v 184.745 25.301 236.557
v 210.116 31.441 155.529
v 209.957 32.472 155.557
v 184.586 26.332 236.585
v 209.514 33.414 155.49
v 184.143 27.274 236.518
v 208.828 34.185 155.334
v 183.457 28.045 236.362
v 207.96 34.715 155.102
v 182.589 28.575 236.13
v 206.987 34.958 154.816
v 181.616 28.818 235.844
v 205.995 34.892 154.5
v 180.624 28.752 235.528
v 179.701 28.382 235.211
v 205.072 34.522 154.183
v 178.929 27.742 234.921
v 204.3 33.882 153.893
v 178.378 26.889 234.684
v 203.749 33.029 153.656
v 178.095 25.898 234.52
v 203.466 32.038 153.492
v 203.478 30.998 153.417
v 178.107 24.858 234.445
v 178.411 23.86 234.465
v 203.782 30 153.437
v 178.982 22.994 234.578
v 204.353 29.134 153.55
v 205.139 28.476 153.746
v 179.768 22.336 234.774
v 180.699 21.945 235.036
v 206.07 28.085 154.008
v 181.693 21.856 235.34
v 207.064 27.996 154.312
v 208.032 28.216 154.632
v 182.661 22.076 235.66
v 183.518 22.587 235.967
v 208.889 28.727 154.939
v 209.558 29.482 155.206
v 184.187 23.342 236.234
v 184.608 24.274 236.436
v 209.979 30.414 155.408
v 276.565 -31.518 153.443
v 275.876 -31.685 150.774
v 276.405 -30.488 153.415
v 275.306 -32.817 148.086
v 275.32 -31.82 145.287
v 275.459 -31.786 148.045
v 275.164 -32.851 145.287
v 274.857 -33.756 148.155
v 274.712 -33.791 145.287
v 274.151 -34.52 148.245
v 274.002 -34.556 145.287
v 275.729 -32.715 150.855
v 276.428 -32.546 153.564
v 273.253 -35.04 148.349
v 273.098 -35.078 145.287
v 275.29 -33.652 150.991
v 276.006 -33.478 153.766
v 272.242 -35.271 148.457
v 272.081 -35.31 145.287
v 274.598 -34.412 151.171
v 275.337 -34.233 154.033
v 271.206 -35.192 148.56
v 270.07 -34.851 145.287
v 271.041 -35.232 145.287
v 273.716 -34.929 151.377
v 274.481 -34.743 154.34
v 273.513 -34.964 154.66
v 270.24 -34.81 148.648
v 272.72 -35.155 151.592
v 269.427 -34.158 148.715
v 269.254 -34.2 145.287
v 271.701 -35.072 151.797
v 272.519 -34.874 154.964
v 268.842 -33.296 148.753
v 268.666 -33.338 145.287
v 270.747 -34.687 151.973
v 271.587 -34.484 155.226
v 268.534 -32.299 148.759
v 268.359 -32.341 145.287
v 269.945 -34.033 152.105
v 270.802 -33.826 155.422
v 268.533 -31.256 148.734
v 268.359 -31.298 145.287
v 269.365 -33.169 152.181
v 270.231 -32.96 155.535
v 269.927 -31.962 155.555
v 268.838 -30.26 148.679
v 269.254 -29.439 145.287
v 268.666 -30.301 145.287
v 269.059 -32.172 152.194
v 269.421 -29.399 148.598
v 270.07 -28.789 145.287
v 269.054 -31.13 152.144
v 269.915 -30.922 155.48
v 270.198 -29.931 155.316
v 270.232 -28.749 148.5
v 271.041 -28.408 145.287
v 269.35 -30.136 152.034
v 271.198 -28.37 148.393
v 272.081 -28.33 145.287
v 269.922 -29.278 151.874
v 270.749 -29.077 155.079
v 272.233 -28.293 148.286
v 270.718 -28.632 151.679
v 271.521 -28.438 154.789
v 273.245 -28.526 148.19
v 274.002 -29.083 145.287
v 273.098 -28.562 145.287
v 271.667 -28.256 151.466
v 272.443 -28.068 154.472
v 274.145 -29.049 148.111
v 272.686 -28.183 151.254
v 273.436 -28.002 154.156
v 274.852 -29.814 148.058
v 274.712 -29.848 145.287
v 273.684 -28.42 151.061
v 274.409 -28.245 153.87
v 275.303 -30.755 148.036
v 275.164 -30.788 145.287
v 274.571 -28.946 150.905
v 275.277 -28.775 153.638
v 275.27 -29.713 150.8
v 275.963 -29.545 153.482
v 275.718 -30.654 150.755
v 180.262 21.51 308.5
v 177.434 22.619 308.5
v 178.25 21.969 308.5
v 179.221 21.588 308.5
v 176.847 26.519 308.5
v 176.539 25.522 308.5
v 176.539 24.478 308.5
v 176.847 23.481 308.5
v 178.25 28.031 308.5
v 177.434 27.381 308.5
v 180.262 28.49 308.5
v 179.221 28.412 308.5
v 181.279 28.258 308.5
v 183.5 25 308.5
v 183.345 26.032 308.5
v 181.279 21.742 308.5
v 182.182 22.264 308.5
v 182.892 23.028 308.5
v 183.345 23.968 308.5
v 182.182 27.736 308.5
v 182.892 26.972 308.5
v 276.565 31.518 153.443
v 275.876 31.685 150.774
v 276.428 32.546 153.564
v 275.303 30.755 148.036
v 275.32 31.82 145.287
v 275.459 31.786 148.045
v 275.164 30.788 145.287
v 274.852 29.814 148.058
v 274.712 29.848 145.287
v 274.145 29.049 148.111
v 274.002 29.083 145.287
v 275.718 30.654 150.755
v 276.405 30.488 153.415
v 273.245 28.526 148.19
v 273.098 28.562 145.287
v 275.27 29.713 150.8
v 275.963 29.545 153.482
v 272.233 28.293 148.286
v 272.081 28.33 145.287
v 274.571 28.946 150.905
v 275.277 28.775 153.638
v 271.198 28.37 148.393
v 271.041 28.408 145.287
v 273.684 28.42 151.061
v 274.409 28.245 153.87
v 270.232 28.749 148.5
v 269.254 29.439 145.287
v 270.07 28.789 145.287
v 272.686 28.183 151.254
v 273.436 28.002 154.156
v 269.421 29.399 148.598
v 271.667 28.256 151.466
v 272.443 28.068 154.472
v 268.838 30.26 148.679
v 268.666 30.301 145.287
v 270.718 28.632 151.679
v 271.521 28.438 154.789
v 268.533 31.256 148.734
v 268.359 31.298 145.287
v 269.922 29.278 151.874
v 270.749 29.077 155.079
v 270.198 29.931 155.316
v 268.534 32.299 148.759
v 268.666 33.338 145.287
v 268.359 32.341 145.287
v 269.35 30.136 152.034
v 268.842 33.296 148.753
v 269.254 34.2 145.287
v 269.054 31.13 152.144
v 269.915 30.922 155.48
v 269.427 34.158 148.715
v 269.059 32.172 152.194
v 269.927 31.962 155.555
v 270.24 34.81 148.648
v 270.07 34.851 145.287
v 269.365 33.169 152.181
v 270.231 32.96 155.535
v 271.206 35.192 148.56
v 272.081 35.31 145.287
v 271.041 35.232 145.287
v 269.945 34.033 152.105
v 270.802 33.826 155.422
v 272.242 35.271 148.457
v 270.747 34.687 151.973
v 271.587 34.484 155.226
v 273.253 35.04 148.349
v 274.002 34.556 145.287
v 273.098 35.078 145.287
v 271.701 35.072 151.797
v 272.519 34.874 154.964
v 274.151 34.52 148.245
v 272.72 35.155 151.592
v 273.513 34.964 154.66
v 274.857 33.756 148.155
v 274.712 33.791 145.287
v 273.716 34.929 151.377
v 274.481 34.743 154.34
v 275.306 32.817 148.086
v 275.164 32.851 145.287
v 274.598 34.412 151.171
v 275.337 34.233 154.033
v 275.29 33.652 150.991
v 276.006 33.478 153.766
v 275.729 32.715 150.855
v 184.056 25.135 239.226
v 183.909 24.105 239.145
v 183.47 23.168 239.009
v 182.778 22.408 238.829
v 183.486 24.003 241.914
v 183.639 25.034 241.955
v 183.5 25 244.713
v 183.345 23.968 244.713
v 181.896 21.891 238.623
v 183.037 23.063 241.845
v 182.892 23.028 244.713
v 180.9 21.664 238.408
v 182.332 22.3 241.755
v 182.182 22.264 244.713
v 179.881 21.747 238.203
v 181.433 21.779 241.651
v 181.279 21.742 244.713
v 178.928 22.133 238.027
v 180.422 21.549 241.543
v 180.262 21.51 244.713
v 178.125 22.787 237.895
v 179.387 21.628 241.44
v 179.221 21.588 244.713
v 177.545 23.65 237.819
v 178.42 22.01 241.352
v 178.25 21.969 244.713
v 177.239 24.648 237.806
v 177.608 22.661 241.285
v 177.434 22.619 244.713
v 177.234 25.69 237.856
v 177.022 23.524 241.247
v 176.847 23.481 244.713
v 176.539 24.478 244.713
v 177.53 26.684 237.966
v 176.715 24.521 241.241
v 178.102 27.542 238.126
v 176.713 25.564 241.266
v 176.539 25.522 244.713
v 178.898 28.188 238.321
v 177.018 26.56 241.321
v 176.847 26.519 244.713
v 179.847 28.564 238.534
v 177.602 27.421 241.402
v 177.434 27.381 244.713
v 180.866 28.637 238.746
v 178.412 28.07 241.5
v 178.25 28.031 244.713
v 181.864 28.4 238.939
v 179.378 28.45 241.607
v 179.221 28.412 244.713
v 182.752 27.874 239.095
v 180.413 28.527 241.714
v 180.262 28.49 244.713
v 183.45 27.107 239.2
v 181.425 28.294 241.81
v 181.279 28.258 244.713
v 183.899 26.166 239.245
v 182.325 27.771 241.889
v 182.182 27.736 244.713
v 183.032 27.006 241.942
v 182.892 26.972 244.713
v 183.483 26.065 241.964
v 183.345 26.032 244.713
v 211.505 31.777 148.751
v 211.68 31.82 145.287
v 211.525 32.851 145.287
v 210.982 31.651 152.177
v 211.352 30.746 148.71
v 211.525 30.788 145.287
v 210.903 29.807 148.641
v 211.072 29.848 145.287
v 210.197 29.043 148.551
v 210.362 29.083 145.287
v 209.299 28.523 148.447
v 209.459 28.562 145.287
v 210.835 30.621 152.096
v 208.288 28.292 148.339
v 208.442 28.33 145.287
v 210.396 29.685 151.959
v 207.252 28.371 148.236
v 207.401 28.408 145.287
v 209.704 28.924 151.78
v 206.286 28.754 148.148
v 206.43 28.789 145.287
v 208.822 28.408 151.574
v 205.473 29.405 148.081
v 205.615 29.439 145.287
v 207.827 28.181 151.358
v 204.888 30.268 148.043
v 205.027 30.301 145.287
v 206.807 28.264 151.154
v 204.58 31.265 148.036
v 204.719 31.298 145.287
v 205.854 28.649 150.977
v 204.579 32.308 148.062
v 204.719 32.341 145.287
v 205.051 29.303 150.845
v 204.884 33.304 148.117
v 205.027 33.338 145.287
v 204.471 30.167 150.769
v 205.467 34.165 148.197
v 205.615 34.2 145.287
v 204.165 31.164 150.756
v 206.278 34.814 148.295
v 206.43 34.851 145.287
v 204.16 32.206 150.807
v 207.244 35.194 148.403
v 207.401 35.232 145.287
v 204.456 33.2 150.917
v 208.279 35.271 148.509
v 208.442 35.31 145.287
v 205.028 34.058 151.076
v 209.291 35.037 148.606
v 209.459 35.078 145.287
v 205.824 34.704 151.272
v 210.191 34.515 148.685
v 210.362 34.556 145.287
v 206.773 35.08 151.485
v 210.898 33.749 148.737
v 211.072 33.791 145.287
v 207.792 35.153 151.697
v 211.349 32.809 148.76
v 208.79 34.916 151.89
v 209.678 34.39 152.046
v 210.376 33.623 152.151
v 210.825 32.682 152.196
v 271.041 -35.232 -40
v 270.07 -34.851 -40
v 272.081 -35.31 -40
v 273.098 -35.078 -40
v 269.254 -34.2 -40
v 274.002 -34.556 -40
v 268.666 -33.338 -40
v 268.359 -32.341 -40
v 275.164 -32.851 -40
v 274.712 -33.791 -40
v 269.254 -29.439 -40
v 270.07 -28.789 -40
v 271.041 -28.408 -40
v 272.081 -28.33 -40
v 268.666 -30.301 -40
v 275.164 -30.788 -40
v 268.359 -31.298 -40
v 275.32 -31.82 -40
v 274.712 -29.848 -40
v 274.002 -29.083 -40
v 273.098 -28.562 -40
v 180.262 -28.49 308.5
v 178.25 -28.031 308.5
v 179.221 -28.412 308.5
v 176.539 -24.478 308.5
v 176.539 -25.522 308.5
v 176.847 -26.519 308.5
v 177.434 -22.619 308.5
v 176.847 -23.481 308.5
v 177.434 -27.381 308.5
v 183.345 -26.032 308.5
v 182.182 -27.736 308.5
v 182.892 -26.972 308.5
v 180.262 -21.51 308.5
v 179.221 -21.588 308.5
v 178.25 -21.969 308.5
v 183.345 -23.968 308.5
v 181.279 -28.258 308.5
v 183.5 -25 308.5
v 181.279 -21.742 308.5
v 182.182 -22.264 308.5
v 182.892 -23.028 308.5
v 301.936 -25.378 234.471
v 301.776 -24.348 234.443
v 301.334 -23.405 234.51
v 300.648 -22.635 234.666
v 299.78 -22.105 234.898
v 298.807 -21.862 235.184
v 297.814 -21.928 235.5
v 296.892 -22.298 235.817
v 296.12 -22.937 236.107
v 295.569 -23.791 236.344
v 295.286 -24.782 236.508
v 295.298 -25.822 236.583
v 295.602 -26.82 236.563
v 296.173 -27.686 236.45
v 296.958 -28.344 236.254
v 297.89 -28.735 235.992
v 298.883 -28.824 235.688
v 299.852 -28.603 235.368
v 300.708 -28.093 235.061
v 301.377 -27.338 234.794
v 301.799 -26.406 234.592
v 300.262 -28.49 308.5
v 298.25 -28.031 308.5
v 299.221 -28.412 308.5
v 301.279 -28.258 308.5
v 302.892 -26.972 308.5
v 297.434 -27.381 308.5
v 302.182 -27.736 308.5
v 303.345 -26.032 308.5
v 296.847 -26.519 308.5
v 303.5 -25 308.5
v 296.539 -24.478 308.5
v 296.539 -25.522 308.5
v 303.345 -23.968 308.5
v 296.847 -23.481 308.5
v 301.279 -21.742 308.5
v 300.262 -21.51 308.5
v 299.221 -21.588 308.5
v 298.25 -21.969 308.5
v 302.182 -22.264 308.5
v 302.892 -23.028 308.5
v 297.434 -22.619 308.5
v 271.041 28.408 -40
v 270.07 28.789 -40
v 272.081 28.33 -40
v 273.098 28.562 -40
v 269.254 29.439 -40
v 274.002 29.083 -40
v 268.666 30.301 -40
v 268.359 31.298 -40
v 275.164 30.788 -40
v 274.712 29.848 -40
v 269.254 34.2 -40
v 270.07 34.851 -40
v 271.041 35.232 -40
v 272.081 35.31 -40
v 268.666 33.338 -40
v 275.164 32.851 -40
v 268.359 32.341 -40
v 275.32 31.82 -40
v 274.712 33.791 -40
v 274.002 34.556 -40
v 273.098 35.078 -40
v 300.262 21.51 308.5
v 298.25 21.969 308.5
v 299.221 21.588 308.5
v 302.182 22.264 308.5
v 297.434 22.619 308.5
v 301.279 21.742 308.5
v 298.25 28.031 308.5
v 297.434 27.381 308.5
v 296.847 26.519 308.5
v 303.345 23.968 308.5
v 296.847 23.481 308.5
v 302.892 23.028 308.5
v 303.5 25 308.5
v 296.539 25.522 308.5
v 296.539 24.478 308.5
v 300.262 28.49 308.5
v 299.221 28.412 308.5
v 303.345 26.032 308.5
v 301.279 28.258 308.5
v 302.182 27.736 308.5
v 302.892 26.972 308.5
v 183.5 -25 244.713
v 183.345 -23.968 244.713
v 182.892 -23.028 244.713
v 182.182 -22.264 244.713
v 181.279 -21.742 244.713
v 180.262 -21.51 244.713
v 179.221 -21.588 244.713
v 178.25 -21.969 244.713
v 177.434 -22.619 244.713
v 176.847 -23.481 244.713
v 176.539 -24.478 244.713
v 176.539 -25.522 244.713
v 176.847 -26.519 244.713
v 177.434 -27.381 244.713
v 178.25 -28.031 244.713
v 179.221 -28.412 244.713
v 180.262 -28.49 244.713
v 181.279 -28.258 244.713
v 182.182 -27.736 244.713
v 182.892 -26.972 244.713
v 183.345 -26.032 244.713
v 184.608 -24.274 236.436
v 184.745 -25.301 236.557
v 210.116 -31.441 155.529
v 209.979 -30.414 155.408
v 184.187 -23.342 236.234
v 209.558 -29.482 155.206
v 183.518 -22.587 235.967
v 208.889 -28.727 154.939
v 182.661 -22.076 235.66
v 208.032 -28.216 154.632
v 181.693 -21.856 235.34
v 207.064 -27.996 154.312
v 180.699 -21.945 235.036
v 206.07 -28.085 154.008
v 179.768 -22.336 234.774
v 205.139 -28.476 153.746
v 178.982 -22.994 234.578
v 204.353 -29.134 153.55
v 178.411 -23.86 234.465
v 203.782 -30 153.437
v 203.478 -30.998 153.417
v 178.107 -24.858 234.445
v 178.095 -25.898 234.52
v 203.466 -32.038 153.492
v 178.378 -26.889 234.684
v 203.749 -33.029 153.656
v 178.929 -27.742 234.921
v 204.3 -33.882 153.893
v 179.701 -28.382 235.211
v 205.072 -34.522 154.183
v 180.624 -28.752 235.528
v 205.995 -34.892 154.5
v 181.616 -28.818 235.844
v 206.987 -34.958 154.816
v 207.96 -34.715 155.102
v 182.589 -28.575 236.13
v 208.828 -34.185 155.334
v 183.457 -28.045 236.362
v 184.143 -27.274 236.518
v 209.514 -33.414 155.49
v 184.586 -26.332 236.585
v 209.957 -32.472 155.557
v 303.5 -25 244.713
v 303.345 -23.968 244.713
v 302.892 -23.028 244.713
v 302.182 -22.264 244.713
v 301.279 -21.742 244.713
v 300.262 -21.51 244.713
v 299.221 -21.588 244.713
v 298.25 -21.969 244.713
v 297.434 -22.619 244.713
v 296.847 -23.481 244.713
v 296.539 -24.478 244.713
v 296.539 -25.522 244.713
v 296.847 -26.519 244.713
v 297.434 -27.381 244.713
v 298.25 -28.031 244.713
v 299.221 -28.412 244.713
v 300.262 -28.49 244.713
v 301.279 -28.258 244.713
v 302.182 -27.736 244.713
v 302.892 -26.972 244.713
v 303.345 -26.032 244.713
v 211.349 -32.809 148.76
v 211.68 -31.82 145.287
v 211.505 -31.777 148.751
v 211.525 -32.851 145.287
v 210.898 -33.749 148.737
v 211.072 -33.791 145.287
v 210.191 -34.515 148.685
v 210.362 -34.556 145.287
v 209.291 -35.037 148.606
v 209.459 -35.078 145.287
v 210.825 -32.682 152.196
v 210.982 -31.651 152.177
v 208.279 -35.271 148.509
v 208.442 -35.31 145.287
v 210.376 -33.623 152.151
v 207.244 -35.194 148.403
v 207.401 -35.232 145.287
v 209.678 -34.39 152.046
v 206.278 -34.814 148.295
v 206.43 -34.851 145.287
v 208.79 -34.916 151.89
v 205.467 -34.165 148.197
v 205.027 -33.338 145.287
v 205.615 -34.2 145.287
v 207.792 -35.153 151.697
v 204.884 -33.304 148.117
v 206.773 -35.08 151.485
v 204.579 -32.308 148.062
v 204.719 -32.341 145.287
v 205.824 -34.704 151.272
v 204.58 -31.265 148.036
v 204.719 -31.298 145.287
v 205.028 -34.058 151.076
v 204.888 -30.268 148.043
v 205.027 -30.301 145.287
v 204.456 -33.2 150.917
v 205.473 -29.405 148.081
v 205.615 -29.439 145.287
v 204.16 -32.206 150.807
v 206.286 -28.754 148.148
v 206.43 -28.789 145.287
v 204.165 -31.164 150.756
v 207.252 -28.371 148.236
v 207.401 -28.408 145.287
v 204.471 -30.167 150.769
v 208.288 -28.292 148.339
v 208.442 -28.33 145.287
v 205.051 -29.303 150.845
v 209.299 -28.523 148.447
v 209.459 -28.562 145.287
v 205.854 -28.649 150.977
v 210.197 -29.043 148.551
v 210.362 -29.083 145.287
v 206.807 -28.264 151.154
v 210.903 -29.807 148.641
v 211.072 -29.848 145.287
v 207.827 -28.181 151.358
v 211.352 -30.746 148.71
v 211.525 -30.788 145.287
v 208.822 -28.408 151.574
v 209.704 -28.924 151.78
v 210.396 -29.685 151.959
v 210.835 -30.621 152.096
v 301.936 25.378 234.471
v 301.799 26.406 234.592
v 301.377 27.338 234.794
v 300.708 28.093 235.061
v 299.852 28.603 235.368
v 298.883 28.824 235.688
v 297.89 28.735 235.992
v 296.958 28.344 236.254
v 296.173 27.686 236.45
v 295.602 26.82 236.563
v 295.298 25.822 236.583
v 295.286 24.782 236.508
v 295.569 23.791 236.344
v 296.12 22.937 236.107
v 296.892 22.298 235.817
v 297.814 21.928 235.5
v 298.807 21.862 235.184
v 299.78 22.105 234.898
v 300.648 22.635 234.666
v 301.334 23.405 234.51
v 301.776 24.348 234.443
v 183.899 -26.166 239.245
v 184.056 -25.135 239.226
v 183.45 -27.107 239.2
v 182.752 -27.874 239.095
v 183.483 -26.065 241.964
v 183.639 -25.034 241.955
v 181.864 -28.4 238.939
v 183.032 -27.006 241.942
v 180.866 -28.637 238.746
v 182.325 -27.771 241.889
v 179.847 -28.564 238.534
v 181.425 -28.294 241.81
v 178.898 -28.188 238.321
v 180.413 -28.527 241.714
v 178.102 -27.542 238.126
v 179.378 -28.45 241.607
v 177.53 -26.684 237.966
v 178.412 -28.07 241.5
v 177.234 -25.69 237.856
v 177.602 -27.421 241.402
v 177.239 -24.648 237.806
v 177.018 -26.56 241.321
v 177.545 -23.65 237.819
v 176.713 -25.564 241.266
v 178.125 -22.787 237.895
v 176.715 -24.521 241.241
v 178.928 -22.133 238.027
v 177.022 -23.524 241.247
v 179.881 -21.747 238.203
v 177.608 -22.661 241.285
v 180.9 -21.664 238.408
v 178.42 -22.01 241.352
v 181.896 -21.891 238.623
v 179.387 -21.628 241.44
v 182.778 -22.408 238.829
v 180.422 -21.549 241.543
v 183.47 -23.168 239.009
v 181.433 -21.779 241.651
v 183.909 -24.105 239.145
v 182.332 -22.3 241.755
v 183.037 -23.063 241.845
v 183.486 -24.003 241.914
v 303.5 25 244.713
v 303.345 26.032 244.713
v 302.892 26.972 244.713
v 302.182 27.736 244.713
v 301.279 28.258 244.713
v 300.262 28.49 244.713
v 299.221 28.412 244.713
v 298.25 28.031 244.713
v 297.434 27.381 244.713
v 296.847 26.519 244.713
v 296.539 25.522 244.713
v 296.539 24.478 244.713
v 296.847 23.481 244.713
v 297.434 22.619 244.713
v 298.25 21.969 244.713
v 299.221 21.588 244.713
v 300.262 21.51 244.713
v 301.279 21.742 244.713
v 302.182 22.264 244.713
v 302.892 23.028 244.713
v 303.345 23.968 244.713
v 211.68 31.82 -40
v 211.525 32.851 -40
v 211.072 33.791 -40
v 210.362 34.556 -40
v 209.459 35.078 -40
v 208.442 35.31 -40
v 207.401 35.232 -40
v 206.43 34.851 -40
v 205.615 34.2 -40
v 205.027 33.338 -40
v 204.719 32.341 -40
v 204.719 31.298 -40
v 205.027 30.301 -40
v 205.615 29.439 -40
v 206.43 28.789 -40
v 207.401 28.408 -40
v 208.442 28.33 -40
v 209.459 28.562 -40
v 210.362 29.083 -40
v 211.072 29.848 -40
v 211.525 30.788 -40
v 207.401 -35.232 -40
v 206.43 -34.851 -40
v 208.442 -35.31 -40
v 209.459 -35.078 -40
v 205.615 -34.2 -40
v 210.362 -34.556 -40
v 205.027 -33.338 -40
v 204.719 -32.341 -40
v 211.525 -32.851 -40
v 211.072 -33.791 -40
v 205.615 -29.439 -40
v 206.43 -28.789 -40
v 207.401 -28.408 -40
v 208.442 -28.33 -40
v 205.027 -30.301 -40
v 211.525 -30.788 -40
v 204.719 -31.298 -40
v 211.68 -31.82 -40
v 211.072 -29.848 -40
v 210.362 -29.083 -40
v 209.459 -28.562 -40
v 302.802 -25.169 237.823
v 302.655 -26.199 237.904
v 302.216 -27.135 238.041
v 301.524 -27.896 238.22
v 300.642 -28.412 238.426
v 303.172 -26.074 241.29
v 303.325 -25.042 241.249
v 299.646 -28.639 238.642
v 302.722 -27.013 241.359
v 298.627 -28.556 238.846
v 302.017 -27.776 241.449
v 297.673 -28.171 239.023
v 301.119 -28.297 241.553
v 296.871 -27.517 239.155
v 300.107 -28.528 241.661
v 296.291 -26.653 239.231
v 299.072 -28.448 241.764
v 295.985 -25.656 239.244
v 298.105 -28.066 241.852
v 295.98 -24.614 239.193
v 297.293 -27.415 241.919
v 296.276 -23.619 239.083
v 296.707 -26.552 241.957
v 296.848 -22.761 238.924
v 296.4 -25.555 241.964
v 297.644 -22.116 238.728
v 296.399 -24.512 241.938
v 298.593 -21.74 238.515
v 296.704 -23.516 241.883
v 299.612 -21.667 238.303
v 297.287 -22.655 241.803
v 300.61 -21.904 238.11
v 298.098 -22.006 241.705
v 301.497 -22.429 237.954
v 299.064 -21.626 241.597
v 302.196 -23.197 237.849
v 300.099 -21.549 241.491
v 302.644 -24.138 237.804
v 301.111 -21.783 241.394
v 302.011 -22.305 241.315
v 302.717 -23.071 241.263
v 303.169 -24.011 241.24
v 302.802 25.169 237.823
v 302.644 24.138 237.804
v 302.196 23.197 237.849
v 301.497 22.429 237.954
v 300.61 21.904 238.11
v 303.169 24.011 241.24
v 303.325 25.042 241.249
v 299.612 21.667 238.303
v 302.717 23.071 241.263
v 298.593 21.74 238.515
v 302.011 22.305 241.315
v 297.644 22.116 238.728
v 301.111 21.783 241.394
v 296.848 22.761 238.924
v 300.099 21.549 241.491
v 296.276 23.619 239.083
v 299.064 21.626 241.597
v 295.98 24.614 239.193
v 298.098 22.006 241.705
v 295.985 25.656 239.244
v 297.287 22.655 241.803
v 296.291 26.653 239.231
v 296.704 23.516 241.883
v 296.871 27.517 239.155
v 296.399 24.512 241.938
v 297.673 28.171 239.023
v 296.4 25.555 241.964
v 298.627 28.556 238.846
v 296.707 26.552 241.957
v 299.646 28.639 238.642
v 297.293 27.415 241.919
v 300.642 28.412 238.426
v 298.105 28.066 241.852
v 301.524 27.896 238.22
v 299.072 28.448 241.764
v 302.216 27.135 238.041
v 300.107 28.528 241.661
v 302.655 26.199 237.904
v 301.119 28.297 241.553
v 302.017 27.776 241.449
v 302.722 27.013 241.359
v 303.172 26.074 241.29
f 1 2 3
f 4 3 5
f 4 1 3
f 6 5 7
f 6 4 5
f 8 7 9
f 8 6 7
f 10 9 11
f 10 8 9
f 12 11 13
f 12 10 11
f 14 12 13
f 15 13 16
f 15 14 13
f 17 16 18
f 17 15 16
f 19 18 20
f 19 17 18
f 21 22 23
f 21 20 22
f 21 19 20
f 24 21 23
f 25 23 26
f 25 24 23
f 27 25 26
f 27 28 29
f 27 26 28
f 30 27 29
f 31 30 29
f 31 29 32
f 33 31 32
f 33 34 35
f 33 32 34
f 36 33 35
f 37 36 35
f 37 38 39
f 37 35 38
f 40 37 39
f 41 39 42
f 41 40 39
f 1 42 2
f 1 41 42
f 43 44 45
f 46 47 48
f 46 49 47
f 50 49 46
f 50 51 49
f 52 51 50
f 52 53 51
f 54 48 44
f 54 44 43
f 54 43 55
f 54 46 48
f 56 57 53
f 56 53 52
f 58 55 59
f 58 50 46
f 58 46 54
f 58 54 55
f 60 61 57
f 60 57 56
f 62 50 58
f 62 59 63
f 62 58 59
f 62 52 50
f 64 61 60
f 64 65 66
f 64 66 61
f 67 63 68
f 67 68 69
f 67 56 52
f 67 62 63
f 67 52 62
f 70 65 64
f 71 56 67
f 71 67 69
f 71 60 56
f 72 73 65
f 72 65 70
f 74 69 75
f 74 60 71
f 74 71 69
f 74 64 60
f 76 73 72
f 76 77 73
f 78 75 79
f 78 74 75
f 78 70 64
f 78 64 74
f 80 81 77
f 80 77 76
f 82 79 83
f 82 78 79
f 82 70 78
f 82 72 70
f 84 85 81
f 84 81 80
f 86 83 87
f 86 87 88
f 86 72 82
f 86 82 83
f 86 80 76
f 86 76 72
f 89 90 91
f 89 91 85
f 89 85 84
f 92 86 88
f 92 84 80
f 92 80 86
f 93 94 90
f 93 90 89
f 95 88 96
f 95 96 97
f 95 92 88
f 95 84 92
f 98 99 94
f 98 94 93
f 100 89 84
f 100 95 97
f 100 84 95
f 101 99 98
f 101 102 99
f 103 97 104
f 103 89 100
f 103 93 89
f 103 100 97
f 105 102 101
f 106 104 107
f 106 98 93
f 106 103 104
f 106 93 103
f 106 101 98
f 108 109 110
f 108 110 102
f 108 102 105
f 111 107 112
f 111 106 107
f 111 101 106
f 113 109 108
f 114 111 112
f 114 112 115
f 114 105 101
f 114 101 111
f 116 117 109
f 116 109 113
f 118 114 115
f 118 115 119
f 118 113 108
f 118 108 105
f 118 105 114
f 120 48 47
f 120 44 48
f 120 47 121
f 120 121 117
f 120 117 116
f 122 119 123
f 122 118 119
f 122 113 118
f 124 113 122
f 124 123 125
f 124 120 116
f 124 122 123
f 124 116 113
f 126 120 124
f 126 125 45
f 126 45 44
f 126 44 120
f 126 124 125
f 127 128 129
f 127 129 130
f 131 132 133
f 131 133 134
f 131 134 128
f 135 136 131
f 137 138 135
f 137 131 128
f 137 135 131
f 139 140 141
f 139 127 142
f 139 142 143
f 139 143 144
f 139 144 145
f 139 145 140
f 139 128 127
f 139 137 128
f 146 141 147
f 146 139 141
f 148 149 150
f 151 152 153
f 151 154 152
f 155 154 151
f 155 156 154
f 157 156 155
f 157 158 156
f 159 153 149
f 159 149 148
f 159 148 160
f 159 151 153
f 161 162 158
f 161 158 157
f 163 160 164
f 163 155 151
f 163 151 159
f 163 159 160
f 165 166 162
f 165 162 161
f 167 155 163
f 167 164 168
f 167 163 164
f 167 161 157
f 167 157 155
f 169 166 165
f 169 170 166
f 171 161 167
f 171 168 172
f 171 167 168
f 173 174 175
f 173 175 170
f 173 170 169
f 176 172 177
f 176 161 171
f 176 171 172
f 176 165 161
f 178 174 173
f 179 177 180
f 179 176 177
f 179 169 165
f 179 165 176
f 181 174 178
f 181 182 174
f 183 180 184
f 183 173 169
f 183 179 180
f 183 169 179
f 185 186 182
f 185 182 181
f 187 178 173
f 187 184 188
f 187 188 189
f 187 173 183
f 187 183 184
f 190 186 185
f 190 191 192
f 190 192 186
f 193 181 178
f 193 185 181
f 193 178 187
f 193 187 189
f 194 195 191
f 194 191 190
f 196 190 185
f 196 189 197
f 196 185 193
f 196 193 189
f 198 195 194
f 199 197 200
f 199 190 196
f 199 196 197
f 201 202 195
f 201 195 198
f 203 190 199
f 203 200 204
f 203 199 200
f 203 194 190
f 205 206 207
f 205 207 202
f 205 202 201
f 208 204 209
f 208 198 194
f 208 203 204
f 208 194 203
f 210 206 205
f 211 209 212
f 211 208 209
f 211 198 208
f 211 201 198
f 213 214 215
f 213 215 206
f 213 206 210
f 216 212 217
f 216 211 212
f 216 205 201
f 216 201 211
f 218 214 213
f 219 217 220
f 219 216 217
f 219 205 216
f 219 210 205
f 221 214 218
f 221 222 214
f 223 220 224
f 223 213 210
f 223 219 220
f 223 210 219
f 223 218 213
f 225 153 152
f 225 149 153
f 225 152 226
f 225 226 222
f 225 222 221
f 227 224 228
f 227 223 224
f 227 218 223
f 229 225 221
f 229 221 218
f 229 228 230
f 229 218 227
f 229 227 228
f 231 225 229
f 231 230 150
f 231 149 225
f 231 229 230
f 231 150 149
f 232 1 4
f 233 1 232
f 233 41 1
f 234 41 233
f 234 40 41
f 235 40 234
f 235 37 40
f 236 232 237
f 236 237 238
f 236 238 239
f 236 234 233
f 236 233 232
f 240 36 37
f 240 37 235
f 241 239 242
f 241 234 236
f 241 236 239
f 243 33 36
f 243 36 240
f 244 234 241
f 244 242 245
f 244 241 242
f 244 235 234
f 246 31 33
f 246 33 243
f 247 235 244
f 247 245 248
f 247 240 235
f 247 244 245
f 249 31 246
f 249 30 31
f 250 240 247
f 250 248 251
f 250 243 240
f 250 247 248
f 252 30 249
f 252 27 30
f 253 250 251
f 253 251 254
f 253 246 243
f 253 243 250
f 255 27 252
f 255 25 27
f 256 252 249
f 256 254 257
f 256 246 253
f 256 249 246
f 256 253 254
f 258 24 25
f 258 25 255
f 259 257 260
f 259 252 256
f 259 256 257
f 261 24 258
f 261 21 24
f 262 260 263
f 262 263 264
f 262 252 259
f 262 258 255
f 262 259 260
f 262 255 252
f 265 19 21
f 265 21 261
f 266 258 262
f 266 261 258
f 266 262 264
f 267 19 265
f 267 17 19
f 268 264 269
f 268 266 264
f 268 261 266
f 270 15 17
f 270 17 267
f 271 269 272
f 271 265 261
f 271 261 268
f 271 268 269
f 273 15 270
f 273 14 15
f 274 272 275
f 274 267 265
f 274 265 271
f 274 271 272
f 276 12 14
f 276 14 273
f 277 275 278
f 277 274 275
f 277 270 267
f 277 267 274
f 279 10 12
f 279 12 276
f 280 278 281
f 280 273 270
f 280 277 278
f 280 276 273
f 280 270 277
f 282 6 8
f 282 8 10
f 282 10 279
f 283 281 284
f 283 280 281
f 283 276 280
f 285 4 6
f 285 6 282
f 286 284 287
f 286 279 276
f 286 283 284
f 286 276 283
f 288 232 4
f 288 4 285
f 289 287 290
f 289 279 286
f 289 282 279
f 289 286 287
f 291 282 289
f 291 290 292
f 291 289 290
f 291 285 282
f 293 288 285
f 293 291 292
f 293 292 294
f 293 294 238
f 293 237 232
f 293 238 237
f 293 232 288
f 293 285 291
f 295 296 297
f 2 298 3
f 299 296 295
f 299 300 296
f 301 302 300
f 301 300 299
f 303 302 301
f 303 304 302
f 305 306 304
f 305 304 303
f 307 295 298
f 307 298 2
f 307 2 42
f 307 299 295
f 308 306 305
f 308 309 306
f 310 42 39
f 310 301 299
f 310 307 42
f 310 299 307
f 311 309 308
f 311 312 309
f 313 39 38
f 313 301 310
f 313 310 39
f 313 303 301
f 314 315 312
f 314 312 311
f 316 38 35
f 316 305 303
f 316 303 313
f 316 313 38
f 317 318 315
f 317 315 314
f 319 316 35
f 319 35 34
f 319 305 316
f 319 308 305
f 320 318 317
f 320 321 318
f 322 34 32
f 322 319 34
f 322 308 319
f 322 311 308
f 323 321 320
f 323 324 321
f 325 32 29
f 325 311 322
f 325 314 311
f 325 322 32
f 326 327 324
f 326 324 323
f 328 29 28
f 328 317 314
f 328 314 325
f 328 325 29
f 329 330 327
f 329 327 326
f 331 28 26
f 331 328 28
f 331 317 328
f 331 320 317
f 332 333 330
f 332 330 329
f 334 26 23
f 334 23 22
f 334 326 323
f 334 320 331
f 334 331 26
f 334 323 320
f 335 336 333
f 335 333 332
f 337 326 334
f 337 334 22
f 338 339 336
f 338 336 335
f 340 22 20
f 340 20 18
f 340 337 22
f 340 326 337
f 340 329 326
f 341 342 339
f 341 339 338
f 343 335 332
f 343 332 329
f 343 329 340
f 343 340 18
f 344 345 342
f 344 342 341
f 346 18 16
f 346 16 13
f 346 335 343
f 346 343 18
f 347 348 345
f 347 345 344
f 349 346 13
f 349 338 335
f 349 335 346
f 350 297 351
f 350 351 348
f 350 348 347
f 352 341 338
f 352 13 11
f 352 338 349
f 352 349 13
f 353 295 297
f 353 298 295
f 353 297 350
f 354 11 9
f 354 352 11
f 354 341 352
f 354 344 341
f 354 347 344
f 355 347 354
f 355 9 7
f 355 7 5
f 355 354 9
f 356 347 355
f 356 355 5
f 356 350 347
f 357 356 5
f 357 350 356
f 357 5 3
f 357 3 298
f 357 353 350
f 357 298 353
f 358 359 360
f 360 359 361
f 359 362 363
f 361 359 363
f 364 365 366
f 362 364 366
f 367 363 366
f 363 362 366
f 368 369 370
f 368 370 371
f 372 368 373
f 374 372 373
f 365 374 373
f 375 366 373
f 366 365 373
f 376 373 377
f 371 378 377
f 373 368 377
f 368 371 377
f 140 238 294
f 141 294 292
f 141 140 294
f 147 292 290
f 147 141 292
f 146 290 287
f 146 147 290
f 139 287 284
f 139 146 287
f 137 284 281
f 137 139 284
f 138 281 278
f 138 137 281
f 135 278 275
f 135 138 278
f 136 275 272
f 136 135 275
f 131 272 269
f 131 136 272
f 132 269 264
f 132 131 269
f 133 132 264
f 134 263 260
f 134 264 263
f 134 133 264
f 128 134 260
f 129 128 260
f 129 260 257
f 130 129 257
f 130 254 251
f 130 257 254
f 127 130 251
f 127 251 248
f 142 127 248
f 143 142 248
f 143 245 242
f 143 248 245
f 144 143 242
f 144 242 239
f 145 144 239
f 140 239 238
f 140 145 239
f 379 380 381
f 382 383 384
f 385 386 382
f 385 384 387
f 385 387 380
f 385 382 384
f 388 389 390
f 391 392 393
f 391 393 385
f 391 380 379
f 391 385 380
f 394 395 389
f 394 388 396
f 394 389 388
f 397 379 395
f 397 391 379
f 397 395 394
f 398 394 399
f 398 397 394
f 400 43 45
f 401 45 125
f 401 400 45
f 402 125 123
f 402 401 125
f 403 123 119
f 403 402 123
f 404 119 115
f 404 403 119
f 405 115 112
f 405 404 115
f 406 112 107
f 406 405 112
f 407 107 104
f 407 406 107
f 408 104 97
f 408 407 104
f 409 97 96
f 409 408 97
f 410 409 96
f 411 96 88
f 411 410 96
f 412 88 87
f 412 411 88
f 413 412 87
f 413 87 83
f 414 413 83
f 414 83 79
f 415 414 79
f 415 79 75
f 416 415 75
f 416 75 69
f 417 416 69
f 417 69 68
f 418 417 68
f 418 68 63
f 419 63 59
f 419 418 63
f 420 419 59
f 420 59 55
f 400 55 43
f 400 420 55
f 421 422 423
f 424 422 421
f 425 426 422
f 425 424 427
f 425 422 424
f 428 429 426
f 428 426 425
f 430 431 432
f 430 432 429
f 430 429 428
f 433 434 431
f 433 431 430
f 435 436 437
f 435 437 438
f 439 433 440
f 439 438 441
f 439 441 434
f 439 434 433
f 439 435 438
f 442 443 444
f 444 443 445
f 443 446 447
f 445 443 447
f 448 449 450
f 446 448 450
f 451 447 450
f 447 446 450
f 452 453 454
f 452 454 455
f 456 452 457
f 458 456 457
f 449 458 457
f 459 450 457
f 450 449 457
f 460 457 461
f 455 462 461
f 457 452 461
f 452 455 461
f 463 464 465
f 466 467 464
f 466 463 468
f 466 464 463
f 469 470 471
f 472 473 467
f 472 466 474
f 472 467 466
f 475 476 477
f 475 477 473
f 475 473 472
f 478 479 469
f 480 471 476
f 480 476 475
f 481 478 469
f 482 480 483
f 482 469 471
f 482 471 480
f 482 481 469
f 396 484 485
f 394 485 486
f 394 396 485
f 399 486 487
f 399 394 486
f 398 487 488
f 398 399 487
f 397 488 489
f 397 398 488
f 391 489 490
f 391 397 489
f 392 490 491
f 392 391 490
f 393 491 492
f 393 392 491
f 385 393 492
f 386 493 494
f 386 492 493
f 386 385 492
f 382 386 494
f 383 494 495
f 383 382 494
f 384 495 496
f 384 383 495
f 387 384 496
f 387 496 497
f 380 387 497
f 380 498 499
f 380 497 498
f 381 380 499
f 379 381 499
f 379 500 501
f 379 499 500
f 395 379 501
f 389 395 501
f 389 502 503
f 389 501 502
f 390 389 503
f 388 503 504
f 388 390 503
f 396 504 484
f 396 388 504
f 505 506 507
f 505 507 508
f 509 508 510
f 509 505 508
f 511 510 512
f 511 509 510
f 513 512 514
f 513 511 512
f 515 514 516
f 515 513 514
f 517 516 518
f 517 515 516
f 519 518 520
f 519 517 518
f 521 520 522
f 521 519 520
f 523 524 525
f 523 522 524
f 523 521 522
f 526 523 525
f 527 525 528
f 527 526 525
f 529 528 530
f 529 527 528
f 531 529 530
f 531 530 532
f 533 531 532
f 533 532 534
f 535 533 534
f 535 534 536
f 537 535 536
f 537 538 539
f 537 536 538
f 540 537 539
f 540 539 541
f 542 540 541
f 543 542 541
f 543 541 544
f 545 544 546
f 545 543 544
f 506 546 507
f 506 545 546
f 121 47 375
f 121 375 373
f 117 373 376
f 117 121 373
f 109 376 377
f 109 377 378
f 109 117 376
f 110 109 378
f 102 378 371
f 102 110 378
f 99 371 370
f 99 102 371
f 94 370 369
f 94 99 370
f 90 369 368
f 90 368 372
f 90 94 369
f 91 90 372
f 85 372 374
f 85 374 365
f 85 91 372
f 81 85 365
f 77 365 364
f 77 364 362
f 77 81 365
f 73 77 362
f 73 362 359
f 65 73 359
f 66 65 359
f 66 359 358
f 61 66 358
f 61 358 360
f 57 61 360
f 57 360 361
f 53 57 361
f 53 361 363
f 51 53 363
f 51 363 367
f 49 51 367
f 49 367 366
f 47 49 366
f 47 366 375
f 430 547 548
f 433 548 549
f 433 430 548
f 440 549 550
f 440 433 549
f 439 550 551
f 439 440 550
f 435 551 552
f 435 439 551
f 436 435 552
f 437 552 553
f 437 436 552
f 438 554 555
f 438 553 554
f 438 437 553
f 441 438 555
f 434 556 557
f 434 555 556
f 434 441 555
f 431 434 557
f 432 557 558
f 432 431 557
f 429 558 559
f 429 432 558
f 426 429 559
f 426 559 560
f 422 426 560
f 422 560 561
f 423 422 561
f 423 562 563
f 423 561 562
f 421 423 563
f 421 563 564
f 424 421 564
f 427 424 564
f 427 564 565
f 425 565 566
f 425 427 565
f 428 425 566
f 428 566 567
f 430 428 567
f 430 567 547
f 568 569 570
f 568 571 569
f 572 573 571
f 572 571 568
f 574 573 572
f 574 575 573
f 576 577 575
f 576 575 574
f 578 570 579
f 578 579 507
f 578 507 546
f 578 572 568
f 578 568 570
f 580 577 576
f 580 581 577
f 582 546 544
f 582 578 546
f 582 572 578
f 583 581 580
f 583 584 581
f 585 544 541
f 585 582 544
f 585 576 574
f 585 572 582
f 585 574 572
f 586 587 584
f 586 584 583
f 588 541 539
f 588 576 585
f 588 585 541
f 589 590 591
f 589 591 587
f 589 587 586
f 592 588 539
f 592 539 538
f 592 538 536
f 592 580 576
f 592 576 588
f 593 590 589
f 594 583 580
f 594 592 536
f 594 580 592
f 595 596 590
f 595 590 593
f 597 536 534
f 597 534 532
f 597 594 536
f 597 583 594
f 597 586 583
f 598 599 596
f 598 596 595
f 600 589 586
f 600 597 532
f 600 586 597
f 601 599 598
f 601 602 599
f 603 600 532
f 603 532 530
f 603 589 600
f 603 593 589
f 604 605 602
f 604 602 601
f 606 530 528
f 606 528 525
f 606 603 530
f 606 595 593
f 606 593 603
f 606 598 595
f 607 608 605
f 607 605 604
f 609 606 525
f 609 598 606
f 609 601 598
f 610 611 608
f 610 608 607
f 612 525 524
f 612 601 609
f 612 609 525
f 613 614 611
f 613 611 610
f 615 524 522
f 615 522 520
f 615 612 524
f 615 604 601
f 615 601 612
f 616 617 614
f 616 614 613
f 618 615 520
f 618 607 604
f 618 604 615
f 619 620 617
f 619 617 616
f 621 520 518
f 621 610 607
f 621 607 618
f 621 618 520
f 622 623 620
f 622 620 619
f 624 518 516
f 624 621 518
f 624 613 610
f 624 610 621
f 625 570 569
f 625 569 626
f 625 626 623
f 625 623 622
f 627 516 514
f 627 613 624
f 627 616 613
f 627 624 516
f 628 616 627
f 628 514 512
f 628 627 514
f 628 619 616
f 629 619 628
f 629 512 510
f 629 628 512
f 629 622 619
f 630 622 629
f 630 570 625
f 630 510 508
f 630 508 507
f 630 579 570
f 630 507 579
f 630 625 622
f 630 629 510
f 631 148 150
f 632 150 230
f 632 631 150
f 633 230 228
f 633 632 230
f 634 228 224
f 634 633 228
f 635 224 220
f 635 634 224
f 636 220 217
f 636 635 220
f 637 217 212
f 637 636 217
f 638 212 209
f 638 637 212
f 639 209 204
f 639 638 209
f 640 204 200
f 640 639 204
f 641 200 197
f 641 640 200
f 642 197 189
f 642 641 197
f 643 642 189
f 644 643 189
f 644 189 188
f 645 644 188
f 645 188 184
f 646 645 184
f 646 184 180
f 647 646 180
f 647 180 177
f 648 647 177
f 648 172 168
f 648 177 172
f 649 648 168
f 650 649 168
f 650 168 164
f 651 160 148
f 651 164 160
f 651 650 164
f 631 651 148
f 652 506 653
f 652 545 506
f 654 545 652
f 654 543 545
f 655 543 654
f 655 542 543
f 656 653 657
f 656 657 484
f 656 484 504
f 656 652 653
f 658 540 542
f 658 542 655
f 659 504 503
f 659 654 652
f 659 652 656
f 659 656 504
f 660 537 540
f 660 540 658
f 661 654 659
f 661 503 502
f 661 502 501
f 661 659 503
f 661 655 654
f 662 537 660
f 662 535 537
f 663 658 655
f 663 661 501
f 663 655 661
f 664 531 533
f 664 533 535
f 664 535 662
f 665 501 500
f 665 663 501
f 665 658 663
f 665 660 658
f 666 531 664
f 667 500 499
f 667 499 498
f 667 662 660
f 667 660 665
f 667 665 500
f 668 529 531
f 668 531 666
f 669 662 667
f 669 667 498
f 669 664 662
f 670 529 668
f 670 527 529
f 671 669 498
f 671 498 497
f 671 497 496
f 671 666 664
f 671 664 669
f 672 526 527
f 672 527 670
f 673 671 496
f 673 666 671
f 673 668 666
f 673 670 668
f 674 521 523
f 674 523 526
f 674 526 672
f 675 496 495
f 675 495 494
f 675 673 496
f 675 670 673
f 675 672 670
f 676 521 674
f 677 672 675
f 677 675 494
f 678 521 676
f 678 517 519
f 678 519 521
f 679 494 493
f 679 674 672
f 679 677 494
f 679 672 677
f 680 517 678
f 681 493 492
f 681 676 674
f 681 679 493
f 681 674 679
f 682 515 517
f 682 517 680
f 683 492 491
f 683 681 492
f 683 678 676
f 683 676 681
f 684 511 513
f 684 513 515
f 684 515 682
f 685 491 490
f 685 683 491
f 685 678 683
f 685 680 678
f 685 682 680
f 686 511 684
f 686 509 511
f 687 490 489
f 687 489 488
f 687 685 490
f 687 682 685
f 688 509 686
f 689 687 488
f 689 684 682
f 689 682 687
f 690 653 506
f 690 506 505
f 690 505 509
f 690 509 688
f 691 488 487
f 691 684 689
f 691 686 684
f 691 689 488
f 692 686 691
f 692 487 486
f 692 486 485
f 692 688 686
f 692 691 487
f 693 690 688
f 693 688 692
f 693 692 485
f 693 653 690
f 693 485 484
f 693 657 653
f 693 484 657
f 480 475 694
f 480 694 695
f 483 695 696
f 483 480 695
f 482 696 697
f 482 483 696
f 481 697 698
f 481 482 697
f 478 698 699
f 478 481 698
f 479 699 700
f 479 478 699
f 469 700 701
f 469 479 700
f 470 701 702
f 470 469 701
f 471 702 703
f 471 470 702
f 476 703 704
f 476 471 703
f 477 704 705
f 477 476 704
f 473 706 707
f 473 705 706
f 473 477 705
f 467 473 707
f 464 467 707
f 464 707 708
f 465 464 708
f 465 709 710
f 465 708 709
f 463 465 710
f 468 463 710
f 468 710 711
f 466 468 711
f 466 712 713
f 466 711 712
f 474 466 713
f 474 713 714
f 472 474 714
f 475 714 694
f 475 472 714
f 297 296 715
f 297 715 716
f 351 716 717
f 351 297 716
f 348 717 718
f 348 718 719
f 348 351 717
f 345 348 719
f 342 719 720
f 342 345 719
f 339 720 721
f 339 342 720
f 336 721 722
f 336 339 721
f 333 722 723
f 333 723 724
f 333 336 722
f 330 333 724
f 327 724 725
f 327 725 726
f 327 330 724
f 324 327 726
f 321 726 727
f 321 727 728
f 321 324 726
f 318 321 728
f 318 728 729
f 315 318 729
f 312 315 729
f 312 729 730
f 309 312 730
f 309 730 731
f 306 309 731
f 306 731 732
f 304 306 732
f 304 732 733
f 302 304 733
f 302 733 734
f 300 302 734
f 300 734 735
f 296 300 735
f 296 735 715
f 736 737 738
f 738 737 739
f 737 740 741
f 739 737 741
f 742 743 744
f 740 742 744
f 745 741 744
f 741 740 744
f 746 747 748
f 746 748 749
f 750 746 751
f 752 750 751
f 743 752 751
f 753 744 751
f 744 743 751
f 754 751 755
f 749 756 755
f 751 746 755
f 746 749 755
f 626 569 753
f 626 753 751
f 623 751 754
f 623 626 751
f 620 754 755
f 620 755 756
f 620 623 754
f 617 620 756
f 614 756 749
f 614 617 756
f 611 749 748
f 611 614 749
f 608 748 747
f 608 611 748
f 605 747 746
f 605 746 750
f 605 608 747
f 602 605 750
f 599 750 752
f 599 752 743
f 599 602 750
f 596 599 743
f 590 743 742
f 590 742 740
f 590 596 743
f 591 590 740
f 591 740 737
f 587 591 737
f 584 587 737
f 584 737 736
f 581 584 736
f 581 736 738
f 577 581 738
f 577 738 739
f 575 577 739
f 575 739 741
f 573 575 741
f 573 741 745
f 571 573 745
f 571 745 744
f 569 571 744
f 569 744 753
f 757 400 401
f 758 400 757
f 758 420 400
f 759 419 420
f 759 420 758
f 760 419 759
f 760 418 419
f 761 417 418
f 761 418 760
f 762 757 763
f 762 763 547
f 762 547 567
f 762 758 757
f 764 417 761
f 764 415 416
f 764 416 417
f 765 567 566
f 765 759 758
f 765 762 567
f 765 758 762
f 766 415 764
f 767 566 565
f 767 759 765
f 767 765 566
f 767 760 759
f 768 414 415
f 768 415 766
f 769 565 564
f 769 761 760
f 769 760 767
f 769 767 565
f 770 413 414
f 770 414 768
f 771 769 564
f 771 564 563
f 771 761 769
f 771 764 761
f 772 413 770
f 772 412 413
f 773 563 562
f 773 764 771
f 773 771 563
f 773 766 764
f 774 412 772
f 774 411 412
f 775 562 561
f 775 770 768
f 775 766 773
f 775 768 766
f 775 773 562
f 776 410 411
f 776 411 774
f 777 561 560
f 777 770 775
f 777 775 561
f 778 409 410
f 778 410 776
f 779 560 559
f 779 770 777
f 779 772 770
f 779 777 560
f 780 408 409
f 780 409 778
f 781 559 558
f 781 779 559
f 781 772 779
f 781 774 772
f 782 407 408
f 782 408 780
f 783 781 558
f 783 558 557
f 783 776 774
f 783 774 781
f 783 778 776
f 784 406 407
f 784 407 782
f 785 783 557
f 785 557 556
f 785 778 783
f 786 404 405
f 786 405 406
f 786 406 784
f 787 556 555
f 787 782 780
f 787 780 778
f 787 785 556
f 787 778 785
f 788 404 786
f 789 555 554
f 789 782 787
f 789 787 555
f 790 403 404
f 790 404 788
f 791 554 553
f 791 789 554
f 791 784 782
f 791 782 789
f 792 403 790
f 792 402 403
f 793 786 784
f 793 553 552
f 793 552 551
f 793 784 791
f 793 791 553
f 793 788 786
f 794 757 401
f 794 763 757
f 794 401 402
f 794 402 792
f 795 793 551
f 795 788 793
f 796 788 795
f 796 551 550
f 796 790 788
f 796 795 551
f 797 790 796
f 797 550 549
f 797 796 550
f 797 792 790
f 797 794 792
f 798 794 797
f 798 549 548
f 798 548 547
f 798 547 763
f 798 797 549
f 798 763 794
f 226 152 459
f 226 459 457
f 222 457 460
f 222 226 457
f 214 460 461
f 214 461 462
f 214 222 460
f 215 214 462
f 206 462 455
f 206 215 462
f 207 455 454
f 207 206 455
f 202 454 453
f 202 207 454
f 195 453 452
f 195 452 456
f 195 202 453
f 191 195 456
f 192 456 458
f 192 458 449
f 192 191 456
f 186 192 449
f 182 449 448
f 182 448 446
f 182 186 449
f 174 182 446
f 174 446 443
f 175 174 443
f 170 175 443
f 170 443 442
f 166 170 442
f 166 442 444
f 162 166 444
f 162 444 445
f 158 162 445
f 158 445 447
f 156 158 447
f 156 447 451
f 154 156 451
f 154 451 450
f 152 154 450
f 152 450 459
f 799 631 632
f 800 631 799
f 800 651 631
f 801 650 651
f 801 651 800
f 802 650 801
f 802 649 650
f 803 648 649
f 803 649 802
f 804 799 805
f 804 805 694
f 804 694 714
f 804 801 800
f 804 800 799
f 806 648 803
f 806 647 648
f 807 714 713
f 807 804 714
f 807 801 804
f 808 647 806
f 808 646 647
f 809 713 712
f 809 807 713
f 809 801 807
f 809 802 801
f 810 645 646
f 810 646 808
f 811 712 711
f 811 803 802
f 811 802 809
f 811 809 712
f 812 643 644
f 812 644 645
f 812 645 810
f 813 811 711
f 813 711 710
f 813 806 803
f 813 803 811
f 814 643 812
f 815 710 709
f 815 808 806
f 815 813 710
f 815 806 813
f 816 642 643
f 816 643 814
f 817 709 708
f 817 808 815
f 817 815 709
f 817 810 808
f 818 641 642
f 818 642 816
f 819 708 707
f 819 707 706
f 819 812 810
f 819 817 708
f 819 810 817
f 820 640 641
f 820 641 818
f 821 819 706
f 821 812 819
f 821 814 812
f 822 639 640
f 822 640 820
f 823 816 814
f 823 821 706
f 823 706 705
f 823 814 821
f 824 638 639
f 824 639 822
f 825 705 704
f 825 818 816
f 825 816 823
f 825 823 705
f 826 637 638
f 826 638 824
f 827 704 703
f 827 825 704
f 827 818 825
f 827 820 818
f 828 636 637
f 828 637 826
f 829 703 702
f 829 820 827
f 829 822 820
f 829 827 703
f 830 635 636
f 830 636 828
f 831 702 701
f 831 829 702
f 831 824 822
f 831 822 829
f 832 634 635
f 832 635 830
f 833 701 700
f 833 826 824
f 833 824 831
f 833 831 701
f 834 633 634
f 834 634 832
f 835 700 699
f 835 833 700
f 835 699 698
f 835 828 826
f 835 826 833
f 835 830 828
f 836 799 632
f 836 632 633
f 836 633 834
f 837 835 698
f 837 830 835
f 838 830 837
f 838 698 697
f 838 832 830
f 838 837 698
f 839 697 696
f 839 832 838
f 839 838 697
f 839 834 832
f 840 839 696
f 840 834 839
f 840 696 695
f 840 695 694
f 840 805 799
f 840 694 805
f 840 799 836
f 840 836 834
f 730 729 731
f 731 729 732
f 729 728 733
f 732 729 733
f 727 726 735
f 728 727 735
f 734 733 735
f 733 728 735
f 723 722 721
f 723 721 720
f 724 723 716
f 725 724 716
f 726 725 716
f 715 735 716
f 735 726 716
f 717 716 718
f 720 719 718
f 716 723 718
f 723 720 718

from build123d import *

# Parameters (mm, degrees)
PIPE_1_PROFILE_R = 3.5
PIPE_2_PROFILE_R = 3.5
PIPE_3_PROFILE_R = 3.5
PIPE_4_PROFILE_R = 3.5


with BuildPart() as part:
    # Pipe 1: sweep along a curve in space
    with BuildLine() as pipe_1_path:
        Line((271.819805153, 31.819805153, -40), (271.819805153, 31.819805153, 145.286984437))
        ThreePointArc((271.819805153, 31.819805153, 145.286984437), (272.173100401, 31.734305221, 149.942894929), (273.224424767, 31.479877338, 154.485979103))
        Line((273.224424767, 31.479877338, 154.485979103), (298.595380387, 25.339927816, 235.514020897))
        ThreePointArc((298.595380387, 25.339927816, 235.514020897), (299.646704753, 25.085499932, 240.057105071), (300, 25, 244.713015563))
        Line((300, 25, 244.713015563), (300, 25, 308.5))
    # Pipe 1 profile (on start of the path) → Pipe 1 (sweep)
    with BuildSketch(Plane(origin=(271.819805153, 31.819805153, -40), x_dir=(1, 0, 0), z_dir=(0, 0, 1))):
        Circle(PIPE_1_PROFILE_R)
    sweep(path=pipe_1_path.line)


with BuildPart() as body_2:
    # Pipe 2: sweep along a curve in space
    with BuildLine() as pipe_2_path:
        Line((208.180194847, 31.819805153, -40), (208.180194847, 31.819805153, 145.286984437))
        ThreePointArc((208.180194847, 31.819805153, 145.286984437), (207.826899599, 31.734305221, 149.942894929), (206.775575233, 31.479877338, 154.485979103))
        Line((206.775575233, 31.479877338, 154.485979103), (181.404619613, 25.339927816, 235.514020897))
        ThreePointArc((181.404619613, 25.339927816, 235.514020897), (180.353295247, 25.085499932, 240.057105071), (180, 25, 244.713015563))
        Line((180, 25, 244.713015563), (180, 25, 308.5))
    # Pipe 2 profile (on start of the path) → Pipe 2 (sweep)
    with BuildSketch(Plane(origin=(208.180194847, 31.819805153, -40), x_dir=(1, 0, 0), z_dir=(0, 0, 1))):
        Circle(PIPE_2_PROFILE_R)
    sweep(path=pipe_2_path.line)


with BuildPart() as body_3:
    # Pipe 3: sweep along a curve in space
    with BuildLine() as pipe_3_path:
        Line((208.180194847, -31.819805153, -40), (208.180194847, -31.819805153, 145.286984437))
        ThreePointArc((208.180194847, -31.819805153, 145.286984437), (207.826899599, -31.734305221, 149.942894929), (206.775575233, -31.479877338, 154.485979103))
        Line((206.775575233, -31.479877338, 154.485979103), (181.404619613, -25.339927816, 235.514020897))
        ThreePointArc((181.404619613, -25.339927816, 235.514020897), (180.353295247, -25.085499932, 240.057105071), (180, -25, 244.713015563))
        Line((180, -25, 244.713015563), (180, -25, 308.5))
    # Pipe 3 profile (on start of the path) → Pipe 3 (sweep)
    with BuildSketch(Plane(origin=(208.180194847, -31.819805153, -40), x_dir=(1, 0, 0), z_dir=(0, 0, 1))):
        Circle(PIPE_3_PROFILE_R)
    sweep(path=pipe_3_path.line)


with BuildPart() as body_4:
    # Pipe 4: sweep along a curve in space
    with BuildLine() as pipe_4_path:
        Line((271.819805153, -31.819805153, -40), (271.819805153, -31.819805153, 145.286984437))
        ThreePointArc((271.819805153, -31.819805153, 145.286984437), (272.173100401, -31.734305221, 149.942894929), (273.224424767, -31.479877338, 154.485979103))
        Line((273.224424767, -31.479877338, 154.485979103), (298.595380387, -25.339927816, 235.514020897))
        ThreePointArc((298.595380387, -25.339927816, 235.514020897), (299.646704753, -25.085499932, 240.057105071), (300, -25, 244.713015563))
        Line((300, -25, 244.713015563), (300, -25, 308.5))
    # Pipe 4 profile (on start of the path) → Pipe 4 (sweep)
    with BuildSketch(Plane(origin=(271.819805153, -31.819805153, -40), x_dir=(1, 0, 0), z_dir=(0, 0, 1))):
        Circle(PIPE_4_PROFILE_R)
    sweep(path=pipe_4_path.line)


solid = Compound([part.part, body_2.part, body_3.part, body_4.part])
